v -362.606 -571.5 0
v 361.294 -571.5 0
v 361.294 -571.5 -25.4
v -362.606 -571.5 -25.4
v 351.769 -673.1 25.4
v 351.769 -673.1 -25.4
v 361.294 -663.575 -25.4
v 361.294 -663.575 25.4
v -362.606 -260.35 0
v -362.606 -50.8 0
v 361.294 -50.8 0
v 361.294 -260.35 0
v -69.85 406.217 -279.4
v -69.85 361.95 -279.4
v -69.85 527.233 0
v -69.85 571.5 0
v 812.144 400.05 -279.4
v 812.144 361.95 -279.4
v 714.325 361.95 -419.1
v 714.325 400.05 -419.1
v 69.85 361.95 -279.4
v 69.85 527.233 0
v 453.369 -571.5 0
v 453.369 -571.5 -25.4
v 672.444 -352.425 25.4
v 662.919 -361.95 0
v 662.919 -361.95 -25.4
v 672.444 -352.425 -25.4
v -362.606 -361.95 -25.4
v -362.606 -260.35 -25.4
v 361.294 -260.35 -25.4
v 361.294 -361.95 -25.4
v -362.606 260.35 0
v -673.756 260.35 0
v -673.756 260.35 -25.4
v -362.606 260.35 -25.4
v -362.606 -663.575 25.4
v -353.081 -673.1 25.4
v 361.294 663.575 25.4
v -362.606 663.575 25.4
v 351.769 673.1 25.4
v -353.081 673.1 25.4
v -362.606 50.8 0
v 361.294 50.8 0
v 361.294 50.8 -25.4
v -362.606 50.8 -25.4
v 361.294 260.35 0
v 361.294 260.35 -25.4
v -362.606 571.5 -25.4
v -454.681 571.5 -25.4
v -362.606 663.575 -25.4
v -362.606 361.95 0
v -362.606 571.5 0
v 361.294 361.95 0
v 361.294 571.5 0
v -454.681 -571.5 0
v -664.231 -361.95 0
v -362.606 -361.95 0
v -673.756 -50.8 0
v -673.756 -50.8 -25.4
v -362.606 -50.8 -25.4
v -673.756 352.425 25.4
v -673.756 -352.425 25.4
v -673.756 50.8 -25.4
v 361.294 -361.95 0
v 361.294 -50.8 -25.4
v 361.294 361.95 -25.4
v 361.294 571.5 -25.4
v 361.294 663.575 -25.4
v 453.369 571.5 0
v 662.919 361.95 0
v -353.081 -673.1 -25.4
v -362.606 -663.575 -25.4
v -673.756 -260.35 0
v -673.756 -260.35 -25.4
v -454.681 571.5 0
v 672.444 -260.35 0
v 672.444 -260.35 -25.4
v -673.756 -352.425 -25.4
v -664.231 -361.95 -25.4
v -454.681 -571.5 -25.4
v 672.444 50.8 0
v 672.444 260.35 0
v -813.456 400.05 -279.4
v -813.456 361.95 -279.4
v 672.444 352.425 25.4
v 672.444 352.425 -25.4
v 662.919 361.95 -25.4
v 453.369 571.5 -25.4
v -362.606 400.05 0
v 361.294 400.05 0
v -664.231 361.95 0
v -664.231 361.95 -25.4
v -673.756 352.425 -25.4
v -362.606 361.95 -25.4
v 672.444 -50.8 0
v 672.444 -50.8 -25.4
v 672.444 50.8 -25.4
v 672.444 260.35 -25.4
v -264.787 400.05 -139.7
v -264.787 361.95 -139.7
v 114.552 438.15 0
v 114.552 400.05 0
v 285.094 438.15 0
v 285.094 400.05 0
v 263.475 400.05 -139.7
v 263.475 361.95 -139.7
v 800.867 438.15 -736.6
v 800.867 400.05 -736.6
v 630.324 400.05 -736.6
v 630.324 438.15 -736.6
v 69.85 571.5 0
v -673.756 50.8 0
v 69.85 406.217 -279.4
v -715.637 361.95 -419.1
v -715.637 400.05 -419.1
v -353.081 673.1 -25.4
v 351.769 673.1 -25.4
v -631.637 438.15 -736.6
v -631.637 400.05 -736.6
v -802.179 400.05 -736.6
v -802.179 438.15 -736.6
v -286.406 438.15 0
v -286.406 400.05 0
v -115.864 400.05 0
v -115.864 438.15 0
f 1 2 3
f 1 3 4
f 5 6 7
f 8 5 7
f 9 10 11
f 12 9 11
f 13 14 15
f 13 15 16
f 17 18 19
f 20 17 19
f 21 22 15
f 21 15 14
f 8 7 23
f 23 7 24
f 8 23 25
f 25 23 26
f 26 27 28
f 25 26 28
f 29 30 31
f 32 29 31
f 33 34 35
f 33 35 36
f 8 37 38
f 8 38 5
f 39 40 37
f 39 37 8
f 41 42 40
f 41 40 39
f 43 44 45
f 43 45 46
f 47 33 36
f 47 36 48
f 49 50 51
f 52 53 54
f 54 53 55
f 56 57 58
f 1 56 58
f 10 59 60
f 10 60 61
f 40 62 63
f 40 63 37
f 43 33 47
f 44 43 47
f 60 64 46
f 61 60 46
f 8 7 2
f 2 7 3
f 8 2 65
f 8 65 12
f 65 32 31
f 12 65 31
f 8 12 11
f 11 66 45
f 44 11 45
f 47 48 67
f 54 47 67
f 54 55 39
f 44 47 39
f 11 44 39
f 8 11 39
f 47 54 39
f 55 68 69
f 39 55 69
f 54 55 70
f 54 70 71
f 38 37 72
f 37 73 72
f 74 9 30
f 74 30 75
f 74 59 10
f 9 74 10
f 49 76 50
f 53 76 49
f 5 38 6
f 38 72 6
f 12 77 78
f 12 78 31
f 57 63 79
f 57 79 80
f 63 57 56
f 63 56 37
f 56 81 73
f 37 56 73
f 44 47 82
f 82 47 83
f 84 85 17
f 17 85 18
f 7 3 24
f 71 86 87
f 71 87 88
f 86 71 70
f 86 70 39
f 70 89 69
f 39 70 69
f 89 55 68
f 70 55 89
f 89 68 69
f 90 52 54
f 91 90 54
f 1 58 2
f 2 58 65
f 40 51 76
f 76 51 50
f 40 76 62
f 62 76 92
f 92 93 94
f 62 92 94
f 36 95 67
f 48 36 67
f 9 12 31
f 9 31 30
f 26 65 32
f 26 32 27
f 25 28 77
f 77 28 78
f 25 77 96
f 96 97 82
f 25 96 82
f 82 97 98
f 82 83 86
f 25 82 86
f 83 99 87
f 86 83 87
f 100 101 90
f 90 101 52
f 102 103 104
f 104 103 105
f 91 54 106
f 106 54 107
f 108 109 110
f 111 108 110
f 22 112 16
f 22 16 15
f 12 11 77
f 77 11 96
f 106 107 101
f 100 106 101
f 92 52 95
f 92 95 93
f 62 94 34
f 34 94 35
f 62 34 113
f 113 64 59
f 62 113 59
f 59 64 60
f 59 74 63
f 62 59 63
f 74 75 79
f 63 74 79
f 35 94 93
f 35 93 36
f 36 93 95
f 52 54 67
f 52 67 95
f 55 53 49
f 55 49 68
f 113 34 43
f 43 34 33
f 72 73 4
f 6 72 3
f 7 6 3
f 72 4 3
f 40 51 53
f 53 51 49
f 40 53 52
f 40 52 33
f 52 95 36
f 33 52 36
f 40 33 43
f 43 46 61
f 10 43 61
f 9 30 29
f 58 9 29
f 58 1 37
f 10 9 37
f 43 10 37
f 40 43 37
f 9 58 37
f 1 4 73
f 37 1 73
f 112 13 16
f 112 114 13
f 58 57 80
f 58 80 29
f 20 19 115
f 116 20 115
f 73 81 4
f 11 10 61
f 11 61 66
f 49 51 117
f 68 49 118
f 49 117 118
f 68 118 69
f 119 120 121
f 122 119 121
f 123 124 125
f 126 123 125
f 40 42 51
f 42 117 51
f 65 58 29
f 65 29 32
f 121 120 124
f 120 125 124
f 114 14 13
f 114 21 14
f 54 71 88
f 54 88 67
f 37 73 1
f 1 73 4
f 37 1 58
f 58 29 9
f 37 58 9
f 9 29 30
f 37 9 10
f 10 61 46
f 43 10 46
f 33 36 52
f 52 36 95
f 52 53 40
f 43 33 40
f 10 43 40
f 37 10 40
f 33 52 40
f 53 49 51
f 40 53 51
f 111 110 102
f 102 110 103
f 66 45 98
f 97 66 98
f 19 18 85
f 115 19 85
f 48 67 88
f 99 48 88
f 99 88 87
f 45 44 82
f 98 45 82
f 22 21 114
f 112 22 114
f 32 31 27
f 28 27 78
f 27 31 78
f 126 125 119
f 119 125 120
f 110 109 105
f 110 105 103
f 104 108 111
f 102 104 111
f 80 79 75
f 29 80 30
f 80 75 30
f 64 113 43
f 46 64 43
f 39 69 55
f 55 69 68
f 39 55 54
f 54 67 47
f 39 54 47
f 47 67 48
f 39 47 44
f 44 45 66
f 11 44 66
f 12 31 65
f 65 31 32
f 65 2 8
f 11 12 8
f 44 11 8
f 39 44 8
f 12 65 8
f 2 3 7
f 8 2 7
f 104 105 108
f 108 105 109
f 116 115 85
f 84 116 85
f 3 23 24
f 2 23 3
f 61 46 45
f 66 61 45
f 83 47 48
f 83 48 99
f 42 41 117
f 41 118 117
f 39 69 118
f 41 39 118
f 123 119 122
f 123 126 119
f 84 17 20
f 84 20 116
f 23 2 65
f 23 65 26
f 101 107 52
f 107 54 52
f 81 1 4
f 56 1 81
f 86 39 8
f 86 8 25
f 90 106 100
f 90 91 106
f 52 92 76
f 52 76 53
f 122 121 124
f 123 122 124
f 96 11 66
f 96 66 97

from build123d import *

# Parameters (mm, degrees)
F1_DEPTH  = 25.4
F0_W      = 311.15
F0_H      = 101.6
F0_H_2    = 209.55
F2_DEPTH  = 25.4
F3_DEPTH  = 25.4
F4_DEPTH  = 25.4
F5_DEPTH  = 25.4
F0_W_2    = 361.95
F6_DEPTH  = 25.4
F9_START  = 38.1
F9_DEPTH  = 38.1
F10_DEPTH = 38.1
F12_DEPTH = 69.85


with BuildPart() as f1:
    # F0 (on Top) → F1 (new body)
    with BuildSketch(Plane.XY):
        Polygon((-362.6062870026, 571.5), (-362.6062870026, 663.575), (-454.6812870026, 571.5), align=None)
    extrude(amount=-F1_DEPTH)



with BuildPart() as f1b:
    # F0 (on Top) → F1, piece 2 (new body)
    with BuildSketch(Plane.XY):
        Polygon((-362.6062870026, 260.35), (-362.6062870026, 361.95), (-664.2312870026, 361.95), (-673.7562870026, 352.425), (-673.7562870026, 260.35), align=None)
    extrude(amount=-F1_DEPTH)


with BuildPart() as f1c:
    # F0 (on Top) → F1, piece 3 (new body)
    with BuildSketch(Plane.XY):
        with Locations((-518.1812870026, 0)):
            Rectangle(F0_W, F0_H)
    extrude(amount=-F1_DEPTH)


with BuildPart() as f1d:
    # F0 (on Top) → F1, piece 4 (new body)
    with BuildSketch(Plane.XY):
        Polygon((-362.6062870026, -361.95), (-362.6062870026, -260.35), (-673.7562870026, -260.35), (-673.7562870026, -352.425), (-664.2312870026, -361.95), align=None)
    extrude(amount=-F1_DEPTH)


with BuildPart() as f1e:
    # F0 (on Top) → F1, piece 5 (new body)
    with BuildSketch(Plane.XY):
        Polygon((-362.6062870026, -663.575), (-362.6062870026, -571.5), (-454.6812870026, -571.5), align=None)
    extrude(amount=-F1_DEPTH)


with BuildPart() as f1_1:
    add(f1.part)

    add(f1b.part)  # F2 merges F1b

    add(f1c.part)  # F2 merges F1c

    add(f1d.part)  # F2 merges F1d

    add(f1e.part)  # F2 merges F1e
    # F0 (on Top) → F2 (join)
    with BuildSketch(Plane.XY):
        Polygon((-362.6062870026, 571.5), (-362.6062870026, 663.575), (-454.6812870026, 571.5), align=None)
        Polygon((-362.6062870026, 361.95), (-362.6062870026, 571.5), (-454.6812870026, 571.5), (-664.2312870026, 361.95), align=None)
        Polygon((-362.6062870026, 260.35), (-362.6062870026, 361.95), (-664.2312870026, 361.95), (-673.7562870026, 352.425), (-673.7562870026, 260.35), align=None)
        with Locations((-518.1812870026, 155.575)):
            Rectangle(F0_W, F0_H_2)
        with Locations((-518.1812870026, 0)):
            Rectangle(F0_W, F0_H)
        with Locations((-518.1812870026, -155.575)):
            Rectangle(F0_W, F0_H_2)
        Polygon((-362.6062870026, -361.95), (-362.6062870026, -260.35), (-673.7562870026, -260.35), (-673.7562870026, -352.425), (-664.2312870026, -361.95), align=None)
        Polygon((-362.6062870026, -571.5), (-362.6062870026, -361.95), (-664.2312870026, -361.95), (-454.6812870026, -571.5), align=None)
        Polygon((-362.6062870026, -663.575), (-362.6062870026, -571.5), (-454.6812870026, -571.5), align=None)
    extrude(amount=F2_DEPTH)


with BuildPart() as f3:
    # F0 (on Top) → F3 (new body)
    with BuildSketch(Plane.XY):
        Polygon((361.2937129974, 663.575), (361.2937129974, 571.5), (453.3687129974, 571.5), align=None)
    extrude(amount=-F3_DEPTH)



with BuildPart() as f3b:
    # F0 (on Top) → F3, piece 2 (new body)
    with BuildSketch(Plane.XY):
        Polygon((662.9187129974, 361.95), (361.2937129974, 361.95), (361.2937129974, 260.35), (672.4437129974, 260.35), (672.4437129974, 352.425), align=None)
    extrude(amount=-F3_DEPTH)


with BuildPart() as f3c:
    # F0 (on Top) → F3, piece 3 (new body)
    with BuildSketch(Plane.XY):
        with Locations((516.8687129974, 0)):
            Rectangle(F0_W, F0_H)
    extrude(amount=-F3_DEPTH)


with BuildPart() as f3d:
    # F0 (on Top) → F3, piece 4 (new body)
    with BuildSketch(Plane.XY):
        Polygon((672.4437129974, -260.35), (361.2937129974, -260.35), (361.2937129974, -361.95), (662.9187129974, -361.95), (672.4437129974, -352.425), align=None)
    extrude(amount=-F3_DEPTH)


with BuildPart() as f3e:
    # F0 (on Top) → F3, piece 5 (new body)
    with BuildSketch(Plane.XY):
        Polygon((453.3687129974, -571.5), (361.2937129974, -571.5), (361.2937129974, -663.575), align=None)
    extrude(amount=-F3_DEPTH)


with BuildPart() as f3_1:
    add(f3.part)

    add(f3b.part)  # F4 merges F3b

    add(f3c.part)  # F4 merges F3c

    add(f3d.part)  # F4 merges F3d

    add(f3e.part)  # F4 merges F3e
    # F0 (on Top) → F4 (join)
    with BuildSketch(Plane.XY):
        Polygon((361.2937129974, 663.575), (361.2937129974, 571.5), (453.3687129974, 571.5), align=None)
        Polygon((453.3687129974, 571.5), (361.2937129974, 571.5), (361.2937129974, 361.95), (662.9187129974, 361.95), align=None)
        Polygon((662.9187129974, 361.95), (361.2937129974, 361.95), (361.2937129974, 260.35), (672.4437129974, 260.35), (672.4437129974, 352.425), align=None)
        with Locations((516.8687129974, 155.575)):
            Rectangle(F0_W, F0_H_2)
        with Locations((516.8687129974, 0)):
            Rectangle(F0_W, F0_H)
        with Locations((516.8687129974, -155.575)):
            Rectangle(F0_W, F0_H_2)
        Polygon((672.4437129974, -260.35), (361.2937129974, -260.35), (361.2937129974, -361.95), (662.9187129974, -361.95), (672.4437129974, -352.425), align=None)
        Polygon((662.9187129974, -361.95), (361.2937129974, -361.95), (361.2937129974, -571.5), (453.3687129974, -571.5), align=None)
        Polygon((453.3687129974, -571.5), (361.2937129974, -571.5), (361.2937129974, -663.575), align=None)
    extrude(amount=F4_DEPTH)


with BuildPart() as f5:
    # F0 (on Top) → F5 (new body)
    with BuildSketch(Plane.XY):
        Polygon((-353.0812870026, 673.1), (-362.6062870026, 663.575), (-362.6062870026, 571.5), (-0.6562870026, 571.5), (-0.6562870026, 673.1), align=None)
        Polygon((-0.6562870026, 673.1), (-0.6562870026, 571.5), (361.2937129974, 571.5), (361.2937129974, 663.575), (351.7687129974, 673.1), align=None)
    extrude(amount=-F5_DEPTH)



with BuildPart() as f5b:
    # F0 (on Top) → F5, piece 2 (new body)
    with BuildSketch(Plane.XY):
        with Locations((-181.6312870026, 311.15)):
            Rectangle(F0_W_2, F0_H)
        with Locations((180.3187129974, 311.15)):
            Rectangle(F0_W_2, F0_H)
    extrude(amount=-F5_DEPTH)


with BuildPart() as f5c:
    # F0 (on Top) → F5, piece 3 (new body)
    with BuildSketch(Plane.XY):
        with Locations((-181.6312870026, 0)):
            Rectangle(F0_W_2, F0_H)
        with Locations((180.3187129974, 0)):
            Rectangle(F0_W_2, F0_H)
    extrude(amount=-F5_DEPTH)


with BuildPart() as f5d:
    # F0 (on Top) → F5, piece 4 (new body)
    with BuildSketch(Plane.XY):
        with Locations((-181.6312870026, -311.15)):
            Rectangle(F0_W_2, F0_H)
        with Locations((180.3187129974, -311.15)):
            Rectangle(F0_W_2, F0_H)
    extrude(amount=-F5_DEPTH)


with BuildPart() as f5e:
    # F0 (on Top) → F5, piece 5 (new body)
    with BuildSketch(Plane.XY):
        Polygon((-0.6562870026, -571.5), (-362.6062870026, -571.5), (-362.6062870026, -663.575), (-353.0812870026, -673.1), (-0.6562870026, -673.1), align=None)
        Polygon((361.2937129974, -571.5), (-0.6562870026, -571.5), (-0.6562870026, -673.1), (351.7687129974, -673.1), (361.2937129974, -663.575), align=None)
    extrude(amount=-F5_DEPTH)


with BuildPart() as f5_1:
    add(f5.part)

    add(f5b.part)  # F6 merges F5b

    add(f5c.part)  # F6 merges F5c

    add(f5d.part)  # F6 merges F5d

    add(f5e.part)  # F6 merges F5e
    # F0 (on Top) → F6 (join)
    with BuildSketch(Plane.XY):
        with Locations((-181.6312870026, 466.725)):
            Rectangle(F0_W_2, F0_H_2)
        with Locations((180.3187129974, 466.725)):
            Rectangle(F0_W_2, F0_H_2)
        Polygon((-353.0812870026, 673.1), (-362.6062870026, 663.575), (-362.6062870026, 571.5), (-0.6562870026, 571.5), (-0.6562870026, 673.1), align=None)
        Polygon((-0.6562870026, 673.1), (-0.6562870026, 571.5), (361.2937129974, 571.5), (361.2937129974, 663.575), (351.7687129974, 673.1), align=None)
        with Locations((-181.6312870026, 311.15)):
            Rectangle(F0_W_2, F0_H)
        with Locations((180.3187129974, 311.15)):
            Rectangle(F0_W_2, F0_H)
        with Locations((-181.6312870026, 155.575)):
            Rectangle(F0_W_2, F0_H_2)
        with Locations((180.3187129974, 155.575)):
            Rectangle(F0_W_2, F0_H_2)
        with Locations((180.3187129974, 0)):
            Rectangle(F0_W_2, F0_H)
        with Locations((-181.6312870026, 0)):
            Rectangle(F0_W_2, F0_H)
        with Locations((-181.6312870026, -155.575)):
            Rectangle(F0_W_2, F0_H_2)
        with Locations((180.3187129974, -155.575)):
            Rectangle(F0_W_2, F0_H_2)
        with Locations((180.3187129974, -311.15)):
            Rectangle(F0_W_2, F0_H)
        with Locations((-181.6312870026, -311.15)):
            Rectangle(F0_W_2, F0_H)
        with Locations((-181.6312870026, -466.725)):
            Rectangle(F0_W_2, F0_H_2)
        with Locations((180.3187129974, -466.725)):
            Rectangle(F0_W_2, F0_H_2)
        Polygon((361.2937129974, -571.5), (-0.6562870026, -571.5), (-0.6562870026, -673.1), (351.7687129974, -673.1), (361.2937129974, -663.575), align=None)
        Polygon((-0.6562870026, -571.5), (-362.6062870026, -571.5), (-362.6062870026, -663.575), (-353.0812870026, -673.1), (-0.6562870026, -673.1), align=None)
    extrude(amount=F6_DEPTH)


with BuildPart() as f9:
    # F8 (on line) → F9 (new body)
    with BuildSketch(Plane(origin=(0, 361.95, 0), x_dir=(-1, 0, 0), z_dir=(0, 1, 0)).offset(F9_START)):
        Polygon((-212.3704960354, -139.7), (-114.5515029475, 0), (-285.0937129974, 0), (-323.1937129974, -54.4124390569), (-263.4747199095, -139.7), align=None)
        Polygon((-310.1894891233, -279.4), (-212.3704960354, -139.7), (-263.4747199095, -139.7), (-323.1937129974, -54.4124390569), (-480.7316991732, -279.4), align=None)
        Polygon((-408.0084822112, -419.1), (-310.1894891233, -279.4), (-480.7316991732, -279.4), (-578.5506922611, -419.1), align=None)
        Polygon((-630.3243755927, -736.6), (-408.0084822112, -419.1), (-578.5506922611, -419.1), (-800.8665856427, -736.6), align=None)
    extrude(amount=F9_DEPTH)


with BuildPart() as f9b:
    # F8 (on line) → F9, piece 2 (new body)
    with BuildSketch(Plane(origin=(0, 361.95, 0), x_dir=(-1, 0, 0), z_dir=(0, 1, 0)).offset(F9_START)):
        Polygon((579.8632662663, -419.1), (409.3210562163, -419.1), (631.6369495979, -736.6), (802.1791596478, -736.6), align=None)
        Polygon((482.0442731784, -279.4), (311.5020631284, -279.4), (409.3210562163, -419.1), (579.8632662663, -419.1), align=None)
        Polygon((264.7872939147, -139.7), (213.6830700405, -139.7), (311.5020631284, -279.4), (482.0442731784, -279.4), (324.5062870026, -54.4124390569), align=None)
        Polygon((286.4062870026, 0), (115.8640769526, 0), (213.6830700405, -139.7), (264.7872939147, -139.7), (324.5062870026, -54.4124390569), align=None)
    extrude(amount=F9_DEPTH)


with BuildPart() as f10:
    # F8 (on line) → F10 (new body)
    with BuildSketch(Plane(origin=(0, 361.95, 0), x_dir=(-1, 0, 0), z_dir=(0, 1, 0))):
        Polygon((-212.3704960354, -139.7), (-114.5515029475, 0), (-285.0937129974, 0), (-323.1937129974, -54.4124390569), (-263.4747199095, -139.7), align=None)
        Polygon((0.6562870026, -139.7), (0.6562870026, 0), (-114.5515029475, 0), (-212.3704960354, -139.7), align=None)
        Polygon((115.8640769526, 0), (0.6562870026, 0), (0.6562870026, -139.7), (213.6830700405, -139.7), align=None)
        Polygon((286.4062870026, 0), (115.8640769526, 0), (213.6830700405, -139.7), (264.7872939147, -139.7), (324.5062870026, -54.4124390569), align=None)
        Polygon((-323.1937129974, -54.4124390569), (-285.0937129974, 0), (-361.2937129974, 0), align=None)
        Polygon((362.6062870026, 0), (286.4062870026, 0), (324.5062870026, -54.4124390569), align=None)
    extrude(amount=F10_DEPTH)


with BuildPart() as f10b:
    # F8 (on line) → F10, piece 2 (new body)
    with BuildSketch(Plane(origin=(0, 361.95, 0), x_dir=(-1, 0, 0), z_dir=(0, 1, 0))):
        Polygon((0.6562870026, -279.4), (-310.1894891233, -279.4), (-408.0084822112, -419.1), (0.6562870026, -419.1), align=None)
        Polygon((409.3210562163, -419.1), (311.5020631284, -279.4), (0.6562870026, -279.4), (0.6562870026, -419.1), align=None)
        Polygon((482.0442731784, -279.4), (311.5020631284, -279.4), (409.3210562163, -419.1), (579.8632662663, -419.1), align=None)
        Polygon((813.4562870026, -279.4), (482.0442731784, -279.4), (579.8632662663, -419.1), (715.6372939147, -419.1), align=None)
        Polygon((-408.0084822112, -419.1), (-310.1894891233, -279.4), (-480.7316991732, -279.4), (-578.5506922611, -419.1), align=None)
        Polygon((-578.5506922611, -419.1), (-480.7316991732, -279.4), (-812.1437129974, -279.4), (-714.3247199095, -419.1), align=None)
    extrude(amount=F10_DEPTH)


with BuildPart() as f12:
    # F11 (on Right) → F12 (new body, symmetric)
    with BuildSketch(Plane.YZ):
        Polygon((406.2173252089, -279.4), (571.5, 0), (546.7129550388, 0), (527.2326747911, 0), (361.95, -279.4), align=None)
    extrude(amount=F12_DEPTH, both=True)


solid = Compound([f1_1.part, f3_1.part, f5_1.part, f9.part, f9b.part, f10.part, f10b.part, f12.part])
